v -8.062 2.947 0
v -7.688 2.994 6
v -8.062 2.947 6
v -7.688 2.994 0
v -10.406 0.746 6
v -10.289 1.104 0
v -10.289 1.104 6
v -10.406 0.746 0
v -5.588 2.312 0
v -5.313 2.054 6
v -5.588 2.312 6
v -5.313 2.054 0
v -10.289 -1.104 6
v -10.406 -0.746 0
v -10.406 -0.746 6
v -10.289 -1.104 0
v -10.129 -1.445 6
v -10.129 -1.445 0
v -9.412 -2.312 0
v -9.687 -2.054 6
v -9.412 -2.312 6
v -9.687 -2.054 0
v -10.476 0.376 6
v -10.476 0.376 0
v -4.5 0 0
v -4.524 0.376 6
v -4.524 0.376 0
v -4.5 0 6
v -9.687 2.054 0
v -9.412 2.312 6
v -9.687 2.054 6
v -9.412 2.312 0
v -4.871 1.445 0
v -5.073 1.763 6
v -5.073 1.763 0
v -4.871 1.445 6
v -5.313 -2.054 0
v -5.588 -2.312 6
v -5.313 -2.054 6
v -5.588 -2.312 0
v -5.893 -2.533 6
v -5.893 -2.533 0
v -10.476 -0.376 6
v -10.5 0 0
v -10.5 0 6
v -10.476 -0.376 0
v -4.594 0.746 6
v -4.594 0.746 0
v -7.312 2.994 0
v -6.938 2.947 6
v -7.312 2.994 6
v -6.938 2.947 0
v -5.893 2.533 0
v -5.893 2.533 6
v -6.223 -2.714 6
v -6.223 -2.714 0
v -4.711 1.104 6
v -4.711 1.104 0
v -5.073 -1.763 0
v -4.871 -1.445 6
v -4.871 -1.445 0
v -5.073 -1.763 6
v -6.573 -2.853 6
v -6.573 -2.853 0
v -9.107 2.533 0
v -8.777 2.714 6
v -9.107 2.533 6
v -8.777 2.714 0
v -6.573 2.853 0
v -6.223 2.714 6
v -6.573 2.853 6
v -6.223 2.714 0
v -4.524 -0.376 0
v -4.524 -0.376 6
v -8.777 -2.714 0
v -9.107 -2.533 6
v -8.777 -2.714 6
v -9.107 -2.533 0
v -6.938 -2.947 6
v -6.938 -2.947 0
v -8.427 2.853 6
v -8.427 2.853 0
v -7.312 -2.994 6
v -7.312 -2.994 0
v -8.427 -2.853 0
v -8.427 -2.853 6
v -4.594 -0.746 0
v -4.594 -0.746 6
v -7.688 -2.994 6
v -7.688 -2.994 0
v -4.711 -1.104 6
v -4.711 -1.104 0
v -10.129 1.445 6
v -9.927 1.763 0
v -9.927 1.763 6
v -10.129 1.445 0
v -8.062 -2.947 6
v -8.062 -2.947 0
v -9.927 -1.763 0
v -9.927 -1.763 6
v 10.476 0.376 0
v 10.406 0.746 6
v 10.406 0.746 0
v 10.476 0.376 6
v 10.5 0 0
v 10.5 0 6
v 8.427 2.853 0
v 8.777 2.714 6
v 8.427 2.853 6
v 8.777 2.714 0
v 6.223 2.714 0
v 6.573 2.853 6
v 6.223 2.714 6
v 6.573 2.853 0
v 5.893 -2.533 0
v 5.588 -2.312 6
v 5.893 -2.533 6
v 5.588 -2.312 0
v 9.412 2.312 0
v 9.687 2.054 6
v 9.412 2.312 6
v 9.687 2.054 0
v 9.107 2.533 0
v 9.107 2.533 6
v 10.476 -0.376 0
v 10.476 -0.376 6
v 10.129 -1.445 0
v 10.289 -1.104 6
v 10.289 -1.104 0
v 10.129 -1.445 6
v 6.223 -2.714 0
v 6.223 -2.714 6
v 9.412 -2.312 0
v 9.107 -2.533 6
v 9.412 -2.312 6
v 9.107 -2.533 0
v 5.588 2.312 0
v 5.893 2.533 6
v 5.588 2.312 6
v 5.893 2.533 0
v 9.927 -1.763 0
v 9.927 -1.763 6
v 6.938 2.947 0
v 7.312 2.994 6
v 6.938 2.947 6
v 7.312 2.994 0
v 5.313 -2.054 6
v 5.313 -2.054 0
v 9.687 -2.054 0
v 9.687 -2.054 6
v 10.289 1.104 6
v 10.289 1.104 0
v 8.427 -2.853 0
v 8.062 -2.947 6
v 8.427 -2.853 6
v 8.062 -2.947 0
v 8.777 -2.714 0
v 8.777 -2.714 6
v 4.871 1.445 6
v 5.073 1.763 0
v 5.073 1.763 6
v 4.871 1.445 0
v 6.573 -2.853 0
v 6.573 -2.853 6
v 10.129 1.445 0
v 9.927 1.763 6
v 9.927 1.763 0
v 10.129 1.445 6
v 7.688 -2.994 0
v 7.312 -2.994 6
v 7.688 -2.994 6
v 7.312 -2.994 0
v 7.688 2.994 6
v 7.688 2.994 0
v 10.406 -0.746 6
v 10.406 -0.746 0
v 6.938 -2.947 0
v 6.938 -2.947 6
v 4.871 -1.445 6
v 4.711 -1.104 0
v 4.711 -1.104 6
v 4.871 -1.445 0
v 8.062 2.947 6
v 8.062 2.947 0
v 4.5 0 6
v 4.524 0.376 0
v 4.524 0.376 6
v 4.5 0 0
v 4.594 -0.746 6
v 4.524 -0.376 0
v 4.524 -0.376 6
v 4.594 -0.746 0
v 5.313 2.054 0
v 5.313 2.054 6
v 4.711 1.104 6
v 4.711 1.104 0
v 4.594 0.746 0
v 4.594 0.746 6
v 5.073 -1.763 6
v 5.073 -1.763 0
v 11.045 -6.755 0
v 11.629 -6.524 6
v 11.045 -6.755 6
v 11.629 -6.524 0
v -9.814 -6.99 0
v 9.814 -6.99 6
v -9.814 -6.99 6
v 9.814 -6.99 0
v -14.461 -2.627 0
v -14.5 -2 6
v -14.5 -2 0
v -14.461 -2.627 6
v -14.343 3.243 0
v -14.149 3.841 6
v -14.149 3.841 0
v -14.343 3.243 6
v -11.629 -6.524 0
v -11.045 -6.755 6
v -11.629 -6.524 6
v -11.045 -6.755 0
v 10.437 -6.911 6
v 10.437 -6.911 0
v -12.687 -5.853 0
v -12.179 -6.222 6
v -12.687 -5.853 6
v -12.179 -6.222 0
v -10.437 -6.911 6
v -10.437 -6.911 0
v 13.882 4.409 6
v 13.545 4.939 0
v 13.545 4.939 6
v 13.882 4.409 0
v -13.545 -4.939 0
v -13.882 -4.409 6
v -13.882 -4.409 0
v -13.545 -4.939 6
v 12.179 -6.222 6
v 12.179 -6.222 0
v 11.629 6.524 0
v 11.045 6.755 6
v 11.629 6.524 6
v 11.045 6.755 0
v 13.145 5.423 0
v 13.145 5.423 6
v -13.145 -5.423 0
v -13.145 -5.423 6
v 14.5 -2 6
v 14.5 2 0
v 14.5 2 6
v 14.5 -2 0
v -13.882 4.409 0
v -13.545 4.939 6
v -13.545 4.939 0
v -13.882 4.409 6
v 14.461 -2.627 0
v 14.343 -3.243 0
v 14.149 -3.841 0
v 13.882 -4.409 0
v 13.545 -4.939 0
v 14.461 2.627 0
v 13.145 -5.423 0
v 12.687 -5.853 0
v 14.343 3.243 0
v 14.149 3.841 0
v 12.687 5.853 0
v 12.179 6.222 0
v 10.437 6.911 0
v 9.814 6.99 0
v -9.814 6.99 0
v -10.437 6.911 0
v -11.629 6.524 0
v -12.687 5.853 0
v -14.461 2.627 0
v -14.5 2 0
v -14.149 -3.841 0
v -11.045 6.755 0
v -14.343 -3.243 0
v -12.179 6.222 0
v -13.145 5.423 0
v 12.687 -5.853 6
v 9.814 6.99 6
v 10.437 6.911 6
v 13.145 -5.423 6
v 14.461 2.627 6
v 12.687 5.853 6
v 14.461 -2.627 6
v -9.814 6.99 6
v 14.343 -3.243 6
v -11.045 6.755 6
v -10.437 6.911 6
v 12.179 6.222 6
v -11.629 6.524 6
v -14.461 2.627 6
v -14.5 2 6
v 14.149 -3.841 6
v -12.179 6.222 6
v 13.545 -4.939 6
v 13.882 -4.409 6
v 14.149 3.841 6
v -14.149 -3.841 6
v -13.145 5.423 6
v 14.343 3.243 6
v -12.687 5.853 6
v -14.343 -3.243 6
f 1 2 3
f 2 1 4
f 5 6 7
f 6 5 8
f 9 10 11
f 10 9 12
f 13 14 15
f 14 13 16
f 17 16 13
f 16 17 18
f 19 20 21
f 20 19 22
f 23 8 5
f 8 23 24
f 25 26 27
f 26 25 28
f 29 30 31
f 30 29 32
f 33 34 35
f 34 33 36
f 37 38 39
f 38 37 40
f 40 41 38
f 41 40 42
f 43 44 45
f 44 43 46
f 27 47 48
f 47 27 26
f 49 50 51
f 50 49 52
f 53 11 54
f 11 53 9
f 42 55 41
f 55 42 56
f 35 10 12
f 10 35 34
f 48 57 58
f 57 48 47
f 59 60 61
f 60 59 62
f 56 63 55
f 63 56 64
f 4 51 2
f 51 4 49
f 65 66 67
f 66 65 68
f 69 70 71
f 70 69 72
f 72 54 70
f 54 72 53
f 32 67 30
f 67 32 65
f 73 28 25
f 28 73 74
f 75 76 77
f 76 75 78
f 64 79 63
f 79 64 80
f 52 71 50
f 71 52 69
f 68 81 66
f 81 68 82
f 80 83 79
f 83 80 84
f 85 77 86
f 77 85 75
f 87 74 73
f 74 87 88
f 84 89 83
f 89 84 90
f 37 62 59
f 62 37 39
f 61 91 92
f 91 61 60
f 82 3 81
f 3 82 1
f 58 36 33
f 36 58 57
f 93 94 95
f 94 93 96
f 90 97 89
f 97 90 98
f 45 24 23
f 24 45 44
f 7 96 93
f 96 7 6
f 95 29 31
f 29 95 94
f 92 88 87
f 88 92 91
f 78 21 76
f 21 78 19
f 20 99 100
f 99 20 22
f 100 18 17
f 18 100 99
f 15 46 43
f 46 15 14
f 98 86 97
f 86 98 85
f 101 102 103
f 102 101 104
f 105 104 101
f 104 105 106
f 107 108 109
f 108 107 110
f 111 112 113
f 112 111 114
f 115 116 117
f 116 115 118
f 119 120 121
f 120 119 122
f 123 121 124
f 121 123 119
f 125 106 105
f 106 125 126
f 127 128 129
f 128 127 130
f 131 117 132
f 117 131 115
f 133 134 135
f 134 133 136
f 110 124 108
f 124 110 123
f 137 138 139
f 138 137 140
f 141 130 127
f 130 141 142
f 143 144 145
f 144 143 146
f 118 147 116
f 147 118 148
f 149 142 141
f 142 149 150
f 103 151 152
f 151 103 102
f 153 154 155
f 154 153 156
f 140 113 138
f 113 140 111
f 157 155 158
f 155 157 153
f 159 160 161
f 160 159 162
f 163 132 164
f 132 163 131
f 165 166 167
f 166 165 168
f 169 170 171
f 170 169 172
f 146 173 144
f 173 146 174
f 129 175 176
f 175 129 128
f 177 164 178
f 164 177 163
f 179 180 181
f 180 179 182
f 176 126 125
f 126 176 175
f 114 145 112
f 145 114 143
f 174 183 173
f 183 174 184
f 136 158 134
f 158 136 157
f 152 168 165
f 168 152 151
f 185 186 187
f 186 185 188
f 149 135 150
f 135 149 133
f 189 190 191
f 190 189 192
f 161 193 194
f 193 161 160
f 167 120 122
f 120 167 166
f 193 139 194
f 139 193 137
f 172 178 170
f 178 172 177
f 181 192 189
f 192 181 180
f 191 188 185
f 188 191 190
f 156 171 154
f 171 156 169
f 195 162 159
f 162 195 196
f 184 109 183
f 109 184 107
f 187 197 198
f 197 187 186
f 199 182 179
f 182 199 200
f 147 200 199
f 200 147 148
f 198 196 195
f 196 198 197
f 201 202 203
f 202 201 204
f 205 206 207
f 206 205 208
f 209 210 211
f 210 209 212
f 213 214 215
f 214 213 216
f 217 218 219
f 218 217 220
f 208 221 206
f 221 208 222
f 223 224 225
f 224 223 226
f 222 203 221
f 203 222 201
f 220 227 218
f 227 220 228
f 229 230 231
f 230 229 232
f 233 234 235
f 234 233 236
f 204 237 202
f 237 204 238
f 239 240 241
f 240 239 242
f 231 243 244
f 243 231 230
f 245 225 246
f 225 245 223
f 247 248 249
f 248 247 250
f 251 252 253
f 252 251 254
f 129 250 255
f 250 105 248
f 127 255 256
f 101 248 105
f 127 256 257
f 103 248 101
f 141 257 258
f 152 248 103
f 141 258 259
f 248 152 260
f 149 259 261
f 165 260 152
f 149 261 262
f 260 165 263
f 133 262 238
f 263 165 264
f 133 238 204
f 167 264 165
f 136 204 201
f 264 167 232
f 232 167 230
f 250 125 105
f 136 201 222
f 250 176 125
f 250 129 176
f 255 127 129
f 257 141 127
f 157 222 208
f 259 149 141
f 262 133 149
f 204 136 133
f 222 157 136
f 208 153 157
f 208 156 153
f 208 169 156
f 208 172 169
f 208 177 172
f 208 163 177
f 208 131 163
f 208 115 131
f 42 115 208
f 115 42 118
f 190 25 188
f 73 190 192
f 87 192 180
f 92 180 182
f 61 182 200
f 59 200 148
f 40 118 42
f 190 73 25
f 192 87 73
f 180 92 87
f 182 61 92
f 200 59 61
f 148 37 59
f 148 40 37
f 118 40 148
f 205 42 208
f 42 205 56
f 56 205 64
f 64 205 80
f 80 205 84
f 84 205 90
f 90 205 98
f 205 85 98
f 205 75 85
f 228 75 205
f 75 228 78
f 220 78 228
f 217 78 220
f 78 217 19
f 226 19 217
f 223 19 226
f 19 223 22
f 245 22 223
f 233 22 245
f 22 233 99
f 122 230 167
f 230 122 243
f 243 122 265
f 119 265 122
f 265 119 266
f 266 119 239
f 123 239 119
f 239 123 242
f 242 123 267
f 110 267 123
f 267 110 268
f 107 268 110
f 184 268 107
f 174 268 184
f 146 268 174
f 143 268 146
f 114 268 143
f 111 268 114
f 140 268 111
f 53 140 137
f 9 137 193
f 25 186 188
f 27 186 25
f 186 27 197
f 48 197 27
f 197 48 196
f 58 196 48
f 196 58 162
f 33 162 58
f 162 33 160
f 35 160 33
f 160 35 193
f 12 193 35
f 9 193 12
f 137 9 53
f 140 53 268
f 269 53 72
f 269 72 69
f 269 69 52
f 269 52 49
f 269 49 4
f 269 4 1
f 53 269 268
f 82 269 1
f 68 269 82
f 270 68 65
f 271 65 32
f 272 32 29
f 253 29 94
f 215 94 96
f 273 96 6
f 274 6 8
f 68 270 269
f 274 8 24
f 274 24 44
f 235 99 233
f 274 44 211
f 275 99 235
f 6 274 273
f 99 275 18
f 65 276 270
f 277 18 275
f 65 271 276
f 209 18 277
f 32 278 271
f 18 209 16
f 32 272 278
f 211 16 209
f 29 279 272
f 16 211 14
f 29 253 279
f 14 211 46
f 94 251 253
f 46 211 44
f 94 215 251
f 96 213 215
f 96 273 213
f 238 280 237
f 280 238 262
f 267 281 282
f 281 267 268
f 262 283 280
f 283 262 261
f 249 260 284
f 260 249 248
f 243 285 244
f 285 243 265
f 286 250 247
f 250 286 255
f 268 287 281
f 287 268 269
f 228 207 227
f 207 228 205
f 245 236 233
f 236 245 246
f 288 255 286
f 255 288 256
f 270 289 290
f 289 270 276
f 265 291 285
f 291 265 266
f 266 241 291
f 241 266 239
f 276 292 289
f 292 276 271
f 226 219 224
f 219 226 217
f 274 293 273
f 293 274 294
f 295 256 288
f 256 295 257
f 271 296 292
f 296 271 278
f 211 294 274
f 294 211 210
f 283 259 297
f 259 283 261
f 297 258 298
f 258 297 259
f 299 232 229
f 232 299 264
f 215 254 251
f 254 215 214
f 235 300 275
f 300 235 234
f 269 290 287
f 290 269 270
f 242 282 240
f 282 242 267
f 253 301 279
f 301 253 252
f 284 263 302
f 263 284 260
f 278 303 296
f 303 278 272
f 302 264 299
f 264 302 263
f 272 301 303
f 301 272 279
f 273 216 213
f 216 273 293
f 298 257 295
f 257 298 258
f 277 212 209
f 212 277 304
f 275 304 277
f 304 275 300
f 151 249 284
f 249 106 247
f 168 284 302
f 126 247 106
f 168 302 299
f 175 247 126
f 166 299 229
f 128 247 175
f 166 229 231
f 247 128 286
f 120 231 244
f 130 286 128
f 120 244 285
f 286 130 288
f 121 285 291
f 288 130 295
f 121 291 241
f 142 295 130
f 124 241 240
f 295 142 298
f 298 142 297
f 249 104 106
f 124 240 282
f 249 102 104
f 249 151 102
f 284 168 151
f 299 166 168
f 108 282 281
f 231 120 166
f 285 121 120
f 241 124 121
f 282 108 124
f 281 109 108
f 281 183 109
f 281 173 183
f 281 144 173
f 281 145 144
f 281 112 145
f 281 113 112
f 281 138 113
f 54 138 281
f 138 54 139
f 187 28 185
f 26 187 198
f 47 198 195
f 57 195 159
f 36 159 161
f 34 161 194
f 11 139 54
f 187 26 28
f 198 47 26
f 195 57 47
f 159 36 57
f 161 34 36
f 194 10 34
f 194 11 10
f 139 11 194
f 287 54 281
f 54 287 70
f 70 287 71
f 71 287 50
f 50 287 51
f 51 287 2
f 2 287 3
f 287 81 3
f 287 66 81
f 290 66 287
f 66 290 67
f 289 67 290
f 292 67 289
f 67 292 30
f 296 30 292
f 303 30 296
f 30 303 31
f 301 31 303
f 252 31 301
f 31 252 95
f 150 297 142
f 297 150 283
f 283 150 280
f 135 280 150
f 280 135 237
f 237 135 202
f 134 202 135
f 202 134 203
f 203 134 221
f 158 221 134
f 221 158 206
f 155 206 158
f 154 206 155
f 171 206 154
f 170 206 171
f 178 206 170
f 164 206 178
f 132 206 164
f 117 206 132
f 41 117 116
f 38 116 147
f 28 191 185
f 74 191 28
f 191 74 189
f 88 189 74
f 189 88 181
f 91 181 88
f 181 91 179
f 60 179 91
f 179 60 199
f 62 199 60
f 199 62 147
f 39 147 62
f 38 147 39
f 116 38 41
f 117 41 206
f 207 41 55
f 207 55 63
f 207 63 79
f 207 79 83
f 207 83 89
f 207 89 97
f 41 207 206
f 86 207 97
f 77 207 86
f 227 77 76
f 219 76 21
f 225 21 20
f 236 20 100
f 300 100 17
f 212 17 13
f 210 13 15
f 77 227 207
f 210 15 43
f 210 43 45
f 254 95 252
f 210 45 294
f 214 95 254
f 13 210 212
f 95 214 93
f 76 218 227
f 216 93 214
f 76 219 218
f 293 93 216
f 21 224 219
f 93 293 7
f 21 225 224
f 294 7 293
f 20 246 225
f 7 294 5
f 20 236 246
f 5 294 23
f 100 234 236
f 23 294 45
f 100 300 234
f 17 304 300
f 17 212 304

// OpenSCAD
$fn = 50;


difference() {
	union() {
		hull() {
			translate(v = [-9.5000000000, 2.0000000000, 0]) {
				cylinder(h = 6, r = 5);
			}
			translate(v = [9.5000000000, 2.0000000000, 0]) {
				cylinder(h = 6, r = 5);
			}
			translate(v = [-9.5000000000, -2.0000000000, 0]) {
				cylinder(h = 6, r = 5);
			}
			translate(v = [9.5000000000, -2.0000000000, 0]) {
				cylinder(h = 6, r = 5);
			}
		}
	}
	union() {
		translate(v = [-7.5000000000, 0.0000000000, -100.0000000000]) {
			cylinder(h = 200, r = 3.0000000000);
		}
		translate(v = [-7.5000000000, 0.0000000000, -100.0000000000]) {
			cylinder(h = 200, r = 3.0000000000);
		}
		translate(v = [7.5000000000, 0.0000000000, -100.0000000000]) {
			cylinder(h = 200, r = 3.0000000000);
		}
		translate(v = [7.5000000000, 0.0000000000, -100.0000000000]) {
			cylinder(h = 200, r = 3.0000000000);
		}
	}
}
